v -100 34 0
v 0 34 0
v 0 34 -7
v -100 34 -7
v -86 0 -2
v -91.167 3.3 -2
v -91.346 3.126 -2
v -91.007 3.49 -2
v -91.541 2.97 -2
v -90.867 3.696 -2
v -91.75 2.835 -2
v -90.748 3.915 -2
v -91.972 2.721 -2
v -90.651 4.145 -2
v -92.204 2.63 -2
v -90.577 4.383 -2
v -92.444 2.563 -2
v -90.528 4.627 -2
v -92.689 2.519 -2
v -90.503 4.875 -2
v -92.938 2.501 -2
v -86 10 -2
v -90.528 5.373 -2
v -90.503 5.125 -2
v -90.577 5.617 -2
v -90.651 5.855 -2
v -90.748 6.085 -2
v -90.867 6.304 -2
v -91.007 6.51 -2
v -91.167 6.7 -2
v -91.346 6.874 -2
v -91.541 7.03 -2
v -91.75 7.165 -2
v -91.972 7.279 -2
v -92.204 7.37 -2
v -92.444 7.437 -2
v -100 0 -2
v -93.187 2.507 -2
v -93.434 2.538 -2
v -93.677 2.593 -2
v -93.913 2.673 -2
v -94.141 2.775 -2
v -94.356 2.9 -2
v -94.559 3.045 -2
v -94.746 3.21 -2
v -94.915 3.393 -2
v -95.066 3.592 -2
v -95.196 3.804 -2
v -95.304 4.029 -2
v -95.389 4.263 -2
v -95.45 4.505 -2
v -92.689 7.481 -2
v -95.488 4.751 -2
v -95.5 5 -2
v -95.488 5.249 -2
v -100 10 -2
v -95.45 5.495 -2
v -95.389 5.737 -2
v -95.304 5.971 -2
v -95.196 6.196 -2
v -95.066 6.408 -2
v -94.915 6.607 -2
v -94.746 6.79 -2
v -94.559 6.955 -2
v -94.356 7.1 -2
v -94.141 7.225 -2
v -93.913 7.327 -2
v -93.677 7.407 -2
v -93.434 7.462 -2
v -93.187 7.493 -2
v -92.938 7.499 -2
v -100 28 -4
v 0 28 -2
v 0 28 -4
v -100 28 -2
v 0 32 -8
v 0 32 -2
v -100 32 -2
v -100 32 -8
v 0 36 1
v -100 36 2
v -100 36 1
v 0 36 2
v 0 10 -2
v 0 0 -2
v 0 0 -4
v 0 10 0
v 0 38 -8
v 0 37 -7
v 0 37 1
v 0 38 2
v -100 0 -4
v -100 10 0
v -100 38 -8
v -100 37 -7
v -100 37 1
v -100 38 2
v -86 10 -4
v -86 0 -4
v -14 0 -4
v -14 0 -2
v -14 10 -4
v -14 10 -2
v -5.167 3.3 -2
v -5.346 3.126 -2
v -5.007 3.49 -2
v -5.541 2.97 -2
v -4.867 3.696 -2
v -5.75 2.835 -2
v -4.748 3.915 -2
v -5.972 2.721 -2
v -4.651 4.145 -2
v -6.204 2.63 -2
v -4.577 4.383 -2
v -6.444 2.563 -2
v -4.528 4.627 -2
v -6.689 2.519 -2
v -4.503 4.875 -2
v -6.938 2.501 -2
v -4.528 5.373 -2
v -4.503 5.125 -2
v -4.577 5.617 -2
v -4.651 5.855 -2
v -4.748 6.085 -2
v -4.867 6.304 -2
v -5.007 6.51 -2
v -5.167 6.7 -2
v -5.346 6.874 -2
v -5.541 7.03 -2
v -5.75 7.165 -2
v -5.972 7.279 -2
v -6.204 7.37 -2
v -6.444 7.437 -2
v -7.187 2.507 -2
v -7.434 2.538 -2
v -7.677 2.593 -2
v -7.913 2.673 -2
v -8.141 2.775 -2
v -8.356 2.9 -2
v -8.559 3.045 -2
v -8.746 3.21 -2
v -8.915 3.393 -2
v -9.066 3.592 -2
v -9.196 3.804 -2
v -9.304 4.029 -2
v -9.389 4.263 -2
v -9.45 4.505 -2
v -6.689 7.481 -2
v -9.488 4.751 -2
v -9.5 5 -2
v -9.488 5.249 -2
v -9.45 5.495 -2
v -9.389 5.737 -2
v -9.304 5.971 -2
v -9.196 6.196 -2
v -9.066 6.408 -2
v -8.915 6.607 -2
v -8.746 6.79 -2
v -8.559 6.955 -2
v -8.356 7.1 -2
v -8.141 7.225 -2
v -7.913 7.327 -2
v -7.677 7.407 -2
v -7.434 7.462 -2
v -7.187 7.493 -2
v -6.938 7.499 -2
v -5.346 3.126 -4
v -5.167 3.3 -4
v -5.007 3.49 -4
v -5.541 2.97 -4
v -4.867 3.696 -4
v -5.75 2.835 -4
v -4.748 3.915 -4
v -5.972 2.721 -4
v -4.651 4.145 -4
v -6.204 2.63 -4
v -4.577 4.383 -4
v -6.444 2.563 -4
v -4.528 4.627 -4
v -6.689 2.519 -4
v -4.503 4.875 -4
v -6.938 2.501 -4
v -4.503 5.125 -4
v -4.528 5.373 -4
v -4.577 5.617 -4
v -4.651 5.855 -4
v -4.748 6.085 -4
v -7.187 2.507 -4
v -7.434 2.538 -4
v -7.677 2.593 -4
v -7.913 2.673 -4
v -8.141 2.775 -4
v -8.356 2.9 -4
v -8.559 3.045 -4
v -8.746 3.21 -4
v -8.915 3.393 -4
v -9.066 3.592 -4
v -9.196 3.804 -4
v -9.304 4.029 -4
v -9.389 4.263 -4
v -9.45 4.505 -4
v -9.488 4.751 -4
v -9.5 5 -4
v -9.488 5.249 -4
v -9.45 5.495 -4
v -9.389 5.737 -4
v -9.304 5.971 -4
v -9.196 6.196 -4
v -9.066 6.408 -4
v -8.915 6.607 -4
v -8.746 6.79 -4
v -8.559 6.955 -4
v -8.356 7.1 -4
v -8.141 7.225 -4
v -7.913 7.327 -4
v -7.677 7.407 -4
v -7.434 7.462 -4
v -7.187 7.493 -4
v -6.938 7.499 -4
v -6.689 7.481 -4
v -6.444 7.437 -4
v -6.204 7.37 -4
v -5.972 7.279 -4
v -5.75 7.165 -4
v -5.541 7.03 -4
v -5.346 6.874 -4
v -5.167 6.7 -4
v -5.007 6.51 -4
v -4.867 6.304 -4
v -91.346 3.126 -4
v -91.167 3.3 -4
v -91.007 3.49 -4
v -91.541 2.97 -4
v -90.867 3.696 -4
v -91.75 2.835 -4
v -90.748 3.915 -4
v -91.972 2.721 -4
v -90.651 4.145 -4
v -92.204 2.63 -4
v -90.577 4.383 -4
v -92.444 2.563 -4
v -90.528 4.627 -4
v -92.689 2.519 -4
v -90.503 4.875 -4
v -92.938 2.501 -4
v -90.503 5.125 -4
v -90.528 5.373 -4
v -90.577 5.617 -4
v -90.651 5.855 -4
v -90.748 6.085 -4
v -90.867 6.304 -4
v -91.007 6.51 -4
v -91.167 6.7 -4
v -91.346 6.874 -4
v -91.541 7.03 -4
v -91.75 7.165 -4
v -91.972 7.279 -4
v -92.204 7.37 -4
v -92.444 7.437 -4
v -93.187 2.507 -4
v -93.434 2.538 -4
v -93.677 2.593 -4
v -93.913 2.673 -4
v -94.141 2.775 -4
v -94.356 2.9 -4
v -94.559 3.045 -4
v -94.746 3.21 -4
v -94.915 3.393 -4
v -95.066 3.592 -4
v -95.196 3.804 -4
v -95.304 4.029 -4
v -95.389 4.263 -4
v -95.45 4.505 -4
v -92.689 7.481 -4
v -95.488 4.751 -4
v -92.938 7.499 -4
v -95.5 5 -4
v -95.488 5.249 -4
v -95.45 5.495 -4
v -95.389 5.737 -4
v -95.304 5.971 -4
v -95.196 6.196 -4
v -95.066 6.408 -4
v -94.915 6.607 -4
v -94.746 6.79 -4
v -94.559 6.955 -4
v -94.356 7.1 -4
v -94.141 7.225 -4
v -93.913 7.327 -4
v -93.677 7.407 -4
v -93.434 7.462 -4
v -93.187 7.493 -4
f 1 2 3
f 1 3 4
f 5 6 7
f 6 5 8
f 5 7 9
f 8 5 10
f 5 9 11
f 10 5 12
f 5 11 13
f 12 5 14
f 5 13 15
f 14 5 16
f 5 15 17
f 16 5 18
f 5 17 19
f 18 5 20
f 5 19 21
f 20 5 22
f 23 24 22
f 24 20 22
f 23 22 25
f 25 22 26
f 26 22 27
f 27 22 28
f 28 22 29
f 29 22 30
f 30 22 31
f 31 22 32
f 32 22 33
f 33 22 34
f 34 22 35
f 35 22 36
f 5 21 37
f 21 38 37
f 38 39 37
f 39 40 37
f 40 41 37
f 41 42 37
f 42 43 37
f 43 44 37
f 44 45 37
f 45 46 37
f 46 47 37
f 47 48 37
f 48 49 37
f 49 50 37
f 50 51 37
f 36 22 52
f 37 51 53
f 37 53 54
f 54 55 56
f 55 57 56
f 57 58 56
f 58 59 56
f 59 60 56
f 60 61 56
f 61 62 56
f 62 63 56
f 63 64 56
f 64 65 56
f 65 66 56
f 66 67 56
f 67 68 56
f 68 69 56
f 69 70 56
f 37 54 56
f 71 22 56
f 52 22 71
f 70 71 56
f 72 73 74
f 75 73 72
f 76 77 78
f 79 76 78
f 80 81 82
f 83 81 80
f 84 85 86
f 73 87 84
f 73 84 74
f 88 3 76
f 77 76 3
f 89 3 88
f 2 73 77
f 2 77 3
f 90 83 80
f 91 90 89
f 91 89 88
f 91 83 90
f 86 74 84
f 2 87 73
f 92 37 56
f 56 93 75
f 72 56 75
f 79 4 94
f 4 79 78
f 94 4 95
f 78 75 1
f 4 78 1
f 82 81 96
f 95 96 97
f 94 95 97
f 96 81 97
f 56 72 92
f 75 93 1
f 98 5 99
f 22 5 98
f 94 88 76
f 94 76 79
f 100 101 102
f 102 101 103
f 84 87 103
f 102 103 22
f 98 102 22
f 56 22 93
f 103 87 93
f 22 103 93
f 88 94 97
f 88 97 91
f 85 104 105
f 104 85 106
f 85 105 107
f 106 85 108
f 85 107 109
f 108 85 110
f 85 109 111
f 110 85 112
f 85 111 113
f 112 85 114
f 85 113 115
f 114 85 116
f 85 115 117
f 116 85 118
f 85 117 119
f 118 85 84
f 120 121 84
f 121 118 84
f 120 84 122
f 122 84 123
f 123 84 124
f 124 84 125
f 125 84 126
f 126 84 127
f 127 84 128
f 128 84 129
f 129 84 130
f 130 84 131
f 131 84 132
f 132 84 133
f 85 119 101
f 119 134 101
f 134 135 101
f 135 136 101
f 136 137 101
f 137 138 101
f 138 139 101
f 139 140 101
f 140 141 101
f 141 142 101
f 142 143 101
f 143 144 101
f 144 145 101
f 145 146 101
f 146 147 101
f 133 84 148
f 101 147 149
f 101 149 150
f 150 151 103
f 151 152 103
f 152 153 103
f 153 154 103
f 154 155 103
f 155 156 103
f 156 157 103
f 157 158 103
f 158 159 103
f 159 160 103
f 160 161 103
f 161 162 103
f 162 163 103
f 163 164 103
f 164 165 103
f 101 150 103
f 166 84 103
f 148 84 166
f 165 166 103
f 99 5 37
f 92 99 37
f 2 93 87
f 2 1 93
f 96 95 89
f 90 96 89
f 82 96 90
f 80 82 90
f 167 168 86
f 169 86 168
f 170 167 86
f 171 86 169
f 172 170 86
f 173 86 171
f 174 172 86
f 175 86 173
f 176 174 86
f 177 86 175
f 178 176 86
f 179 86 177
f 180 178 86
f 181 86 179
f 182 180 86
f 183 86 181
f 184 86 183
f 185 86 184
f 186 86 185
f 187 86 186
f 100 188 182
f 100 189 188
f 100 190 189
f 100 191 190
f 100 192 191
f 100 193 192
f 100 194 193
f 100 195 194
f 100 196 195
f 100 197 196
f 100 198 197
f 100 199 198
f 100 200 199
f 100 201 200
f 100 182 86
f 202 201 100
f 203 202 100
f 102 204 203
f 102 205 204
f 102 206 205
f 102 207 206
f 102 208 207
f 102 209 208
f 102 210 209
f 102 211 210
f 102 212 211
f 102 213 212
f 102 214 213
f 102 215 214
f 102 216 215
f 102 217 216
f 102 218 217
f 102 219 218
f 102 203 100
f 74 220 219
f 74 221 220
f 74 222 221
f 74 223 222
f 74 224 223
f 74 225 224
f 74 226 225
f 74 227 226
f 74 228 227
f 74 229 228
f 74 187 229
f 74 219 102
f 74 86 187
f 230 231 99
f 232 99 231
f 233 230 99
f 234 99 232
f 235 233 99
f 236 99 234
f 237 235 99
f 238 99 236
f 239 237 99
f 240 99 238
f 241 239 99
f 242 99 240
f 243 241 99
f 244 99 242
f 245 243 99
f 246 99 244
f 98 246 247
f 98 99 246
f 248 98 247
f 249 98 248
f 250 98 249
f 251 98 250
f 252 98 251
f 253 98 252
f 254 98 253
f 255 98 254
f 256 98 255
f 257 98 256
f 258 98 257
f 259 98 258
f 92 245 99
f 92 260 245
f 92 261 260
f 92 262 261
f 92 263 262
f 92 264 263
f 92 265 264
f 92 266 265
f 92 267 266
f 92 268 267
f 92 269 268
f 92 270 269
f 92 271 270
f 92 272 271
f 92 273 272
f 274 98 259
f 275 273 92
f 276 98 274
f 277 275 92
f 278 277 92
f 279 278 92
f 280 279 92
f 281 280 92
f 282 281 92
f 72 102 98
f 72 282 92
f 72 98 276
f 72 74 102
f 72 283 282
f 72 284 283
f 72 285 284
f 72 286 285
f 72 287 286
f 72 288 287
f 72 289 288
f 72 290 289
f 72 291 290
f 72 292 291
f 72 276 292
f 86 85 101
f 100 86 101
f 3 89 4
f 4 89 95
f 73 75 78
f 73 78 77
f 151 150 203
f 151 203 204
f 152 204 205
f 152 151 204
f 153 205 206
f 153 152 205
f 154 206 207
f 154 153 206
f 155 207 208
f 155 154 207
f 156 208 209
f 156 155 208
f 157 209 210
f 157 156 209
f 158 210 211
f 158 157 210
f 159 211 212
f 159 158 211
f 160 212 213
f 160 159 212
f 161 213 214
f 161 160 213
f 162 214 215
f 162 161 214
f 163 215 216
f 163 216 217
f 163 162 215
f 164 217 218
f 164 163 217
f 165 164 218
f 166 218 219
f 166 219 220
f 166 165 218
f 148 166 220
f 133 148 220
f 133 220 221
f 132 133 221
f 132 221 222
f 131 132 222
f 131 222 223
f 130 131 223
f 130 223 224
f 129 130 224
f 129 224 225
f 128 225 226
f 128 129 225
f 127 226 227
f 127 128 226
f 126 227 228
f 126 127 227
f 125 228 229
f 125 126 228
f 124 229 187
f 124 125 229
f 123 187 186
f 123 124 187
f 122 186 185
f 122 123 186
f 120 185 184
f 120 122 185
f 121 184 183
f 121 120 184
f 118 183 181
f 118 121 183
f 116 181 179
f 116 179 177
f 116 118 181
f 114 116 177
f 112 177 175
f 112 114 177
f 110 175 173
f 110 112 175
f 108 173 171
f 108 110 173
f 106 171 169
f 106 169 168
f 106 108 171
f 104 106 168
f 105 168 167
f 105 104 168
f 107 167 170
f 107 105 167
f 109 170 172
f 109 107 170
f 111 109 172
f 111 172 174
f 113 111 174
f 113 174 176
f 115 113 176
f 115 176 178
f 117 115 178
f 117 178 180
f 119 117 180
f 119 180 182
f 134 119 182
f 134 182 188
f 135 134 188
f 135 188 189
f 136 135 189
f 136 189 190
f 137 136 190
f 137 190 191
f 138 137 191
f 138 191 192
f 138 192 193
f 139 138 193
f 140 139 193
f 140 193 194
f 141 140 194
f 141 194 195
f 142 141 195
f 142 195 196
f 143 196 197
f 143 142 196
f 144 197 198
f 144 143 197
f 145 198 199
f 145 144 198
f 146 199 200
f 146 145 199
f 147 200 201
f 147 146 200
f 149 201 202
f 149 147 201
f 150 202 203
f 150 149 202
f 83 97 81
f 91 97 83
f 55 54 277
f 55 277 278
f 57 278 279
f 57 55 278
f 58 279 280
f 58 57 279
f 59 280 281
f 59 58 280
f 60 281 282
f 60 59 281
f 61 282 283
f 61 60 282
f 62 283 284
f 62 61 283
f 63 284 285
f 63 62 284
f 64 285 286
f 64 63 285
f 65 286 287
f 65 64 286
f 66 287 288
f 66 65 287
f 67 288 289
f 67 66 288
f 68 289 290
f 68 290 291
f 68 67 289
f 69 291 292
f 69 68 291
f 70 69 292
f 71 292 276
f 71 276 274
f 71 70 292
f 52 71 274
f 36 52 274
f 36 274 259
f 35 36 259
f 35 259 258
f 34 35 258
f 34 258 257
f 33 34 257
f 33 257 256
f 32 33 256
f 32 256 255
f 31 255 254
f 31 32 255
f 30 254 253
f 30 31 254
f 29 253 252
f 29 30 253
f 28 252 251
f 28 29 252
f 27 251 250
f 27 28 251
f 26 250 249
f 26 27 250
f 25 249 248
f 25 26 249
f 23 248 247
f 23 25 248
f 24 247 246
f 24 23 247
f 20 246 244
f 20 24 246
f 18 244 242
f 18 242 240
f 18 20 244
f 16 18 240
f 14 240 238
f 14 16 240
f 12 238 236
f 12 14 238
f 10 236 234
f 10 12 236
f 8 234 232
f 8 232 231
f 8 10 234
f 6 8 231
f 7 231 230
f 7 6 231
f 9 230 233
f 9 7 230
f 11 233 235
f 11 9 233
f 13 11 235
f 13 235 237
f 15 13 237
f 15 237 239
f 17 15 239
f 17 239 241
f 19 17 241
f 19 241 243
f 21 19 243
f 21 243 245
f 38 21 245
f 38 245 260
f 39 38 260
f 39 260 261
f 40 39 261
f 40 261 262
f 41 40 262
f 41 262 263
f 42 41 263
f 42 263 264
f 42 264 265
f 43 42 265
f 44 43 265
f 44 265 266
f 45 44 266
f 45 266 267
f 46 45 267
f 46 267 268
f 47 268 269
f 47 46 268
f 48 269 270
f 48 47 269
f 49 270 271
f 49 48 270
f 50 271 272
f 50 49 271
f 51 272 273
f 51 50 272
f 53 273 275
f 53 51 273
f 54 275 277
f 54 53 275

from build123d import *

# Parameters (mm, degrees)
ESQUISSE1_W             = 100
ESQUISSE1_H             = 12
ESQUISSE1_R             = 2.5
BOSS_EXTRU_1_DEPTH      = 2
ESQUISSE2_W             = 100
ESQUISSE2_H             = 2
BOSS_EXTRU_2_DEPTH      = 2
ESQUISSE3_W             = 100
ESQUISSE3_H             = 4
BOSS_EXTRU_3_DEPTH      = 22
ESQUISSE4_W             = 100
ESQUISSE4_H             = 2
ENL_V_MAT_EXTRU_1_DEPTH = 6
ESQUISSE5_W             = 100
ESQUISSE5_H             = 2
BOSS_EXTRU_4_DEPTH      = 6
ESQUISSE6_W             = 100
ESQUISSE6_H             = 6
BOSS_EXTRU_5_DEPTH      = 1
ESQUISSE9_W             = 100
ESQUISSE9_H             = 1
BOSS_EXTRU_8_DEPTH      = 9
ESQUISSE10_W            = 100
ESQUISSE10_H            = 1
BOSS_EXTRU_9_DEPTH      = 1
ESQUISSE11_W            = 100
ESQUISSE11_H            = 28
ESQUISSE11_R            = 2.5
BOSS_EXTRU_10_DEPTH     = 2
ESQUISSE12_W            = 100
ESQUISSE12_H            = 28
ENL_V_MAT_EXTRU_2_DEPTH = 2
ESQUISSE13_W            = 72
ESQUISSE13_H            = 10
ENL_V_MAT_EXTRU_3_DEPTH = 2


with BuildPart() as part:
    # Esquisse1 → Boss.-Extru.1 (new body)
    with BuildSketch(Plane.XY):
        with Locations((-50, 6)):
            Rectangle(ESQUISSE1_W, ESQUISSE1_H)
        with Locations((-93, 5)):
            Circle(ESQUISSE1_R, mode=Mode.SUBTRACT)
        with Locations((-7, 5)):
            Circle(ESQUISSE1_R, mode=Mode.SUBTRACT)
    extrude(amount=BOSS_EXTRU_1_DEPTH)

    # Esquisse2 → Boss.-Extru.2 (add)
    with BuildSketch(Plane(origin=(0, 0, 0), x_dir=(-1, 0, 0), z_dir=(0, 0, -1))):
        with Locations((50, 11)):
            Rectangle(ESQUISSE2_W, ESQUISSE2_H)
    extrude(amount=BOSS_EXTRU_2_DEPTH)

    # Esquisse3 → Boss.-Extru.3 (add)
    with BuildSketch(Plane(origin=(0, 12, 0), x_dir=(1, 0, 0), z_dir=(0, 1, 0))):
        with Locations((-50, 0)):
            Rectangle(ESQUISSE3_W, ESQUISSE3_H)
    extrude(amount=BOSS_EXTRU_3_DEPTH)

    # Esquisse4 → Enlèv. mat.-Extru.1 (cut)
    with BuildSketch(Plane(origin=(0, 34, 0), x_dir=(1, 0, 0), z_dir=(0, 1, 0))):
        with Locations((-50, -1)):
            Rectangle(ESQUISSE4_W, ESQUISSE4_H)
    extrude(amount=-ENL_V_MAT_EXTRU_1_DEPTH, mode=Mode.SUBTRACT)

    # Esquisse5 → Boss.-Extru.4 (add)
    with BuildSketch(Plane(origin=(0, 0, -2), x_dir=(-1, 0, 0), z_dir=(0, 0, -1))):
        with Locations((50, 33)):
            Rectangle(ESQUISSE5_W, ESQUISSE5_H)
    extrude(amount=BOSS_EXTRU_4_DEPTH)

    # Esquisse6 → Boss.-Extru.5 (add)
    with BuildSketch(Plane(origin=(0, 0, -8), x_dir=(-1, 0, 0), z_dir=(0, 0, -1))):
        with Locations((50, 35)):
            Rectangle(ESQUISSE6_W, ESQUISSE6_H)
    extrude(amount=-BOSS_EXTRU_5_DEPTH)

    # Esquisse9 → Boss.-Extru.8 (add)
    with BuildSketch(Plane.XY.offset(-7)):
        with Locations((-50, 37.5)):
            Rectangle(ESQUISSE9_W, ESQUISSE9_H)
    extrude(amount=BOSS_EXTRU_8_DEPTH)

    # Esquisse10 → Boss.-Extru.9 (add)
    with BuildSketch(Plane.XZ.offset(-37)):
        with Locations((-50, 1.5)):
            Rectangle(ESQUISSE10_W, ESQUISSE10_H)
    extrude(amount=BOSS_EXTRU_9_DEPTH)

    # Esquisse11 → Boss.-Extru.10 (add)
    with BuildSketch(Plane(origin=(0, 0, -2), x_dir=(-1, 0, 0), z_dir=(0, 0, -1))):
        with Locations((50, 14)):
            Rectangle(ESQUISSE11_W, ESQUISSE11_H)
        with Locations((93, 5)):
            Circle(ESQUISSE11_R, mode=Mode.SUBTRACT)
        with Locations((7, 5)):
            Circle(ESQUISSE11_R, mode=Mode.SUBTRACT)
    extrude(amount=BOSS_EXTRU_10_DEPTH)

    # Esquisse12 → Enlèv. mat.-Extru.2 (cut)
    with BuildSketch(Plane.XY.offset(2)):
        with Locations((-50, 14)):
            Rectangle(ESQUISSE12_W, ESQUISSE12_H)
    extrude(amount=-ENL_V_MAT_EXTRU_2_DEPTH, mode=Mode.SUBTRACT)

    # Esquisse13 → Enlèv. mat.-Extru.3 (cut)
    with BuildSketch(Plane.XY.offset(-2)):
        with Locations((-50, 5)):
            Rectangle(ESQUISSE13_W, ESQUISSE13_H)
    extrude(amount=-ENL_V_MAT_EXTRU_3_DEPTH, mode=Mode.SUBTRACT)


solid = part.part
